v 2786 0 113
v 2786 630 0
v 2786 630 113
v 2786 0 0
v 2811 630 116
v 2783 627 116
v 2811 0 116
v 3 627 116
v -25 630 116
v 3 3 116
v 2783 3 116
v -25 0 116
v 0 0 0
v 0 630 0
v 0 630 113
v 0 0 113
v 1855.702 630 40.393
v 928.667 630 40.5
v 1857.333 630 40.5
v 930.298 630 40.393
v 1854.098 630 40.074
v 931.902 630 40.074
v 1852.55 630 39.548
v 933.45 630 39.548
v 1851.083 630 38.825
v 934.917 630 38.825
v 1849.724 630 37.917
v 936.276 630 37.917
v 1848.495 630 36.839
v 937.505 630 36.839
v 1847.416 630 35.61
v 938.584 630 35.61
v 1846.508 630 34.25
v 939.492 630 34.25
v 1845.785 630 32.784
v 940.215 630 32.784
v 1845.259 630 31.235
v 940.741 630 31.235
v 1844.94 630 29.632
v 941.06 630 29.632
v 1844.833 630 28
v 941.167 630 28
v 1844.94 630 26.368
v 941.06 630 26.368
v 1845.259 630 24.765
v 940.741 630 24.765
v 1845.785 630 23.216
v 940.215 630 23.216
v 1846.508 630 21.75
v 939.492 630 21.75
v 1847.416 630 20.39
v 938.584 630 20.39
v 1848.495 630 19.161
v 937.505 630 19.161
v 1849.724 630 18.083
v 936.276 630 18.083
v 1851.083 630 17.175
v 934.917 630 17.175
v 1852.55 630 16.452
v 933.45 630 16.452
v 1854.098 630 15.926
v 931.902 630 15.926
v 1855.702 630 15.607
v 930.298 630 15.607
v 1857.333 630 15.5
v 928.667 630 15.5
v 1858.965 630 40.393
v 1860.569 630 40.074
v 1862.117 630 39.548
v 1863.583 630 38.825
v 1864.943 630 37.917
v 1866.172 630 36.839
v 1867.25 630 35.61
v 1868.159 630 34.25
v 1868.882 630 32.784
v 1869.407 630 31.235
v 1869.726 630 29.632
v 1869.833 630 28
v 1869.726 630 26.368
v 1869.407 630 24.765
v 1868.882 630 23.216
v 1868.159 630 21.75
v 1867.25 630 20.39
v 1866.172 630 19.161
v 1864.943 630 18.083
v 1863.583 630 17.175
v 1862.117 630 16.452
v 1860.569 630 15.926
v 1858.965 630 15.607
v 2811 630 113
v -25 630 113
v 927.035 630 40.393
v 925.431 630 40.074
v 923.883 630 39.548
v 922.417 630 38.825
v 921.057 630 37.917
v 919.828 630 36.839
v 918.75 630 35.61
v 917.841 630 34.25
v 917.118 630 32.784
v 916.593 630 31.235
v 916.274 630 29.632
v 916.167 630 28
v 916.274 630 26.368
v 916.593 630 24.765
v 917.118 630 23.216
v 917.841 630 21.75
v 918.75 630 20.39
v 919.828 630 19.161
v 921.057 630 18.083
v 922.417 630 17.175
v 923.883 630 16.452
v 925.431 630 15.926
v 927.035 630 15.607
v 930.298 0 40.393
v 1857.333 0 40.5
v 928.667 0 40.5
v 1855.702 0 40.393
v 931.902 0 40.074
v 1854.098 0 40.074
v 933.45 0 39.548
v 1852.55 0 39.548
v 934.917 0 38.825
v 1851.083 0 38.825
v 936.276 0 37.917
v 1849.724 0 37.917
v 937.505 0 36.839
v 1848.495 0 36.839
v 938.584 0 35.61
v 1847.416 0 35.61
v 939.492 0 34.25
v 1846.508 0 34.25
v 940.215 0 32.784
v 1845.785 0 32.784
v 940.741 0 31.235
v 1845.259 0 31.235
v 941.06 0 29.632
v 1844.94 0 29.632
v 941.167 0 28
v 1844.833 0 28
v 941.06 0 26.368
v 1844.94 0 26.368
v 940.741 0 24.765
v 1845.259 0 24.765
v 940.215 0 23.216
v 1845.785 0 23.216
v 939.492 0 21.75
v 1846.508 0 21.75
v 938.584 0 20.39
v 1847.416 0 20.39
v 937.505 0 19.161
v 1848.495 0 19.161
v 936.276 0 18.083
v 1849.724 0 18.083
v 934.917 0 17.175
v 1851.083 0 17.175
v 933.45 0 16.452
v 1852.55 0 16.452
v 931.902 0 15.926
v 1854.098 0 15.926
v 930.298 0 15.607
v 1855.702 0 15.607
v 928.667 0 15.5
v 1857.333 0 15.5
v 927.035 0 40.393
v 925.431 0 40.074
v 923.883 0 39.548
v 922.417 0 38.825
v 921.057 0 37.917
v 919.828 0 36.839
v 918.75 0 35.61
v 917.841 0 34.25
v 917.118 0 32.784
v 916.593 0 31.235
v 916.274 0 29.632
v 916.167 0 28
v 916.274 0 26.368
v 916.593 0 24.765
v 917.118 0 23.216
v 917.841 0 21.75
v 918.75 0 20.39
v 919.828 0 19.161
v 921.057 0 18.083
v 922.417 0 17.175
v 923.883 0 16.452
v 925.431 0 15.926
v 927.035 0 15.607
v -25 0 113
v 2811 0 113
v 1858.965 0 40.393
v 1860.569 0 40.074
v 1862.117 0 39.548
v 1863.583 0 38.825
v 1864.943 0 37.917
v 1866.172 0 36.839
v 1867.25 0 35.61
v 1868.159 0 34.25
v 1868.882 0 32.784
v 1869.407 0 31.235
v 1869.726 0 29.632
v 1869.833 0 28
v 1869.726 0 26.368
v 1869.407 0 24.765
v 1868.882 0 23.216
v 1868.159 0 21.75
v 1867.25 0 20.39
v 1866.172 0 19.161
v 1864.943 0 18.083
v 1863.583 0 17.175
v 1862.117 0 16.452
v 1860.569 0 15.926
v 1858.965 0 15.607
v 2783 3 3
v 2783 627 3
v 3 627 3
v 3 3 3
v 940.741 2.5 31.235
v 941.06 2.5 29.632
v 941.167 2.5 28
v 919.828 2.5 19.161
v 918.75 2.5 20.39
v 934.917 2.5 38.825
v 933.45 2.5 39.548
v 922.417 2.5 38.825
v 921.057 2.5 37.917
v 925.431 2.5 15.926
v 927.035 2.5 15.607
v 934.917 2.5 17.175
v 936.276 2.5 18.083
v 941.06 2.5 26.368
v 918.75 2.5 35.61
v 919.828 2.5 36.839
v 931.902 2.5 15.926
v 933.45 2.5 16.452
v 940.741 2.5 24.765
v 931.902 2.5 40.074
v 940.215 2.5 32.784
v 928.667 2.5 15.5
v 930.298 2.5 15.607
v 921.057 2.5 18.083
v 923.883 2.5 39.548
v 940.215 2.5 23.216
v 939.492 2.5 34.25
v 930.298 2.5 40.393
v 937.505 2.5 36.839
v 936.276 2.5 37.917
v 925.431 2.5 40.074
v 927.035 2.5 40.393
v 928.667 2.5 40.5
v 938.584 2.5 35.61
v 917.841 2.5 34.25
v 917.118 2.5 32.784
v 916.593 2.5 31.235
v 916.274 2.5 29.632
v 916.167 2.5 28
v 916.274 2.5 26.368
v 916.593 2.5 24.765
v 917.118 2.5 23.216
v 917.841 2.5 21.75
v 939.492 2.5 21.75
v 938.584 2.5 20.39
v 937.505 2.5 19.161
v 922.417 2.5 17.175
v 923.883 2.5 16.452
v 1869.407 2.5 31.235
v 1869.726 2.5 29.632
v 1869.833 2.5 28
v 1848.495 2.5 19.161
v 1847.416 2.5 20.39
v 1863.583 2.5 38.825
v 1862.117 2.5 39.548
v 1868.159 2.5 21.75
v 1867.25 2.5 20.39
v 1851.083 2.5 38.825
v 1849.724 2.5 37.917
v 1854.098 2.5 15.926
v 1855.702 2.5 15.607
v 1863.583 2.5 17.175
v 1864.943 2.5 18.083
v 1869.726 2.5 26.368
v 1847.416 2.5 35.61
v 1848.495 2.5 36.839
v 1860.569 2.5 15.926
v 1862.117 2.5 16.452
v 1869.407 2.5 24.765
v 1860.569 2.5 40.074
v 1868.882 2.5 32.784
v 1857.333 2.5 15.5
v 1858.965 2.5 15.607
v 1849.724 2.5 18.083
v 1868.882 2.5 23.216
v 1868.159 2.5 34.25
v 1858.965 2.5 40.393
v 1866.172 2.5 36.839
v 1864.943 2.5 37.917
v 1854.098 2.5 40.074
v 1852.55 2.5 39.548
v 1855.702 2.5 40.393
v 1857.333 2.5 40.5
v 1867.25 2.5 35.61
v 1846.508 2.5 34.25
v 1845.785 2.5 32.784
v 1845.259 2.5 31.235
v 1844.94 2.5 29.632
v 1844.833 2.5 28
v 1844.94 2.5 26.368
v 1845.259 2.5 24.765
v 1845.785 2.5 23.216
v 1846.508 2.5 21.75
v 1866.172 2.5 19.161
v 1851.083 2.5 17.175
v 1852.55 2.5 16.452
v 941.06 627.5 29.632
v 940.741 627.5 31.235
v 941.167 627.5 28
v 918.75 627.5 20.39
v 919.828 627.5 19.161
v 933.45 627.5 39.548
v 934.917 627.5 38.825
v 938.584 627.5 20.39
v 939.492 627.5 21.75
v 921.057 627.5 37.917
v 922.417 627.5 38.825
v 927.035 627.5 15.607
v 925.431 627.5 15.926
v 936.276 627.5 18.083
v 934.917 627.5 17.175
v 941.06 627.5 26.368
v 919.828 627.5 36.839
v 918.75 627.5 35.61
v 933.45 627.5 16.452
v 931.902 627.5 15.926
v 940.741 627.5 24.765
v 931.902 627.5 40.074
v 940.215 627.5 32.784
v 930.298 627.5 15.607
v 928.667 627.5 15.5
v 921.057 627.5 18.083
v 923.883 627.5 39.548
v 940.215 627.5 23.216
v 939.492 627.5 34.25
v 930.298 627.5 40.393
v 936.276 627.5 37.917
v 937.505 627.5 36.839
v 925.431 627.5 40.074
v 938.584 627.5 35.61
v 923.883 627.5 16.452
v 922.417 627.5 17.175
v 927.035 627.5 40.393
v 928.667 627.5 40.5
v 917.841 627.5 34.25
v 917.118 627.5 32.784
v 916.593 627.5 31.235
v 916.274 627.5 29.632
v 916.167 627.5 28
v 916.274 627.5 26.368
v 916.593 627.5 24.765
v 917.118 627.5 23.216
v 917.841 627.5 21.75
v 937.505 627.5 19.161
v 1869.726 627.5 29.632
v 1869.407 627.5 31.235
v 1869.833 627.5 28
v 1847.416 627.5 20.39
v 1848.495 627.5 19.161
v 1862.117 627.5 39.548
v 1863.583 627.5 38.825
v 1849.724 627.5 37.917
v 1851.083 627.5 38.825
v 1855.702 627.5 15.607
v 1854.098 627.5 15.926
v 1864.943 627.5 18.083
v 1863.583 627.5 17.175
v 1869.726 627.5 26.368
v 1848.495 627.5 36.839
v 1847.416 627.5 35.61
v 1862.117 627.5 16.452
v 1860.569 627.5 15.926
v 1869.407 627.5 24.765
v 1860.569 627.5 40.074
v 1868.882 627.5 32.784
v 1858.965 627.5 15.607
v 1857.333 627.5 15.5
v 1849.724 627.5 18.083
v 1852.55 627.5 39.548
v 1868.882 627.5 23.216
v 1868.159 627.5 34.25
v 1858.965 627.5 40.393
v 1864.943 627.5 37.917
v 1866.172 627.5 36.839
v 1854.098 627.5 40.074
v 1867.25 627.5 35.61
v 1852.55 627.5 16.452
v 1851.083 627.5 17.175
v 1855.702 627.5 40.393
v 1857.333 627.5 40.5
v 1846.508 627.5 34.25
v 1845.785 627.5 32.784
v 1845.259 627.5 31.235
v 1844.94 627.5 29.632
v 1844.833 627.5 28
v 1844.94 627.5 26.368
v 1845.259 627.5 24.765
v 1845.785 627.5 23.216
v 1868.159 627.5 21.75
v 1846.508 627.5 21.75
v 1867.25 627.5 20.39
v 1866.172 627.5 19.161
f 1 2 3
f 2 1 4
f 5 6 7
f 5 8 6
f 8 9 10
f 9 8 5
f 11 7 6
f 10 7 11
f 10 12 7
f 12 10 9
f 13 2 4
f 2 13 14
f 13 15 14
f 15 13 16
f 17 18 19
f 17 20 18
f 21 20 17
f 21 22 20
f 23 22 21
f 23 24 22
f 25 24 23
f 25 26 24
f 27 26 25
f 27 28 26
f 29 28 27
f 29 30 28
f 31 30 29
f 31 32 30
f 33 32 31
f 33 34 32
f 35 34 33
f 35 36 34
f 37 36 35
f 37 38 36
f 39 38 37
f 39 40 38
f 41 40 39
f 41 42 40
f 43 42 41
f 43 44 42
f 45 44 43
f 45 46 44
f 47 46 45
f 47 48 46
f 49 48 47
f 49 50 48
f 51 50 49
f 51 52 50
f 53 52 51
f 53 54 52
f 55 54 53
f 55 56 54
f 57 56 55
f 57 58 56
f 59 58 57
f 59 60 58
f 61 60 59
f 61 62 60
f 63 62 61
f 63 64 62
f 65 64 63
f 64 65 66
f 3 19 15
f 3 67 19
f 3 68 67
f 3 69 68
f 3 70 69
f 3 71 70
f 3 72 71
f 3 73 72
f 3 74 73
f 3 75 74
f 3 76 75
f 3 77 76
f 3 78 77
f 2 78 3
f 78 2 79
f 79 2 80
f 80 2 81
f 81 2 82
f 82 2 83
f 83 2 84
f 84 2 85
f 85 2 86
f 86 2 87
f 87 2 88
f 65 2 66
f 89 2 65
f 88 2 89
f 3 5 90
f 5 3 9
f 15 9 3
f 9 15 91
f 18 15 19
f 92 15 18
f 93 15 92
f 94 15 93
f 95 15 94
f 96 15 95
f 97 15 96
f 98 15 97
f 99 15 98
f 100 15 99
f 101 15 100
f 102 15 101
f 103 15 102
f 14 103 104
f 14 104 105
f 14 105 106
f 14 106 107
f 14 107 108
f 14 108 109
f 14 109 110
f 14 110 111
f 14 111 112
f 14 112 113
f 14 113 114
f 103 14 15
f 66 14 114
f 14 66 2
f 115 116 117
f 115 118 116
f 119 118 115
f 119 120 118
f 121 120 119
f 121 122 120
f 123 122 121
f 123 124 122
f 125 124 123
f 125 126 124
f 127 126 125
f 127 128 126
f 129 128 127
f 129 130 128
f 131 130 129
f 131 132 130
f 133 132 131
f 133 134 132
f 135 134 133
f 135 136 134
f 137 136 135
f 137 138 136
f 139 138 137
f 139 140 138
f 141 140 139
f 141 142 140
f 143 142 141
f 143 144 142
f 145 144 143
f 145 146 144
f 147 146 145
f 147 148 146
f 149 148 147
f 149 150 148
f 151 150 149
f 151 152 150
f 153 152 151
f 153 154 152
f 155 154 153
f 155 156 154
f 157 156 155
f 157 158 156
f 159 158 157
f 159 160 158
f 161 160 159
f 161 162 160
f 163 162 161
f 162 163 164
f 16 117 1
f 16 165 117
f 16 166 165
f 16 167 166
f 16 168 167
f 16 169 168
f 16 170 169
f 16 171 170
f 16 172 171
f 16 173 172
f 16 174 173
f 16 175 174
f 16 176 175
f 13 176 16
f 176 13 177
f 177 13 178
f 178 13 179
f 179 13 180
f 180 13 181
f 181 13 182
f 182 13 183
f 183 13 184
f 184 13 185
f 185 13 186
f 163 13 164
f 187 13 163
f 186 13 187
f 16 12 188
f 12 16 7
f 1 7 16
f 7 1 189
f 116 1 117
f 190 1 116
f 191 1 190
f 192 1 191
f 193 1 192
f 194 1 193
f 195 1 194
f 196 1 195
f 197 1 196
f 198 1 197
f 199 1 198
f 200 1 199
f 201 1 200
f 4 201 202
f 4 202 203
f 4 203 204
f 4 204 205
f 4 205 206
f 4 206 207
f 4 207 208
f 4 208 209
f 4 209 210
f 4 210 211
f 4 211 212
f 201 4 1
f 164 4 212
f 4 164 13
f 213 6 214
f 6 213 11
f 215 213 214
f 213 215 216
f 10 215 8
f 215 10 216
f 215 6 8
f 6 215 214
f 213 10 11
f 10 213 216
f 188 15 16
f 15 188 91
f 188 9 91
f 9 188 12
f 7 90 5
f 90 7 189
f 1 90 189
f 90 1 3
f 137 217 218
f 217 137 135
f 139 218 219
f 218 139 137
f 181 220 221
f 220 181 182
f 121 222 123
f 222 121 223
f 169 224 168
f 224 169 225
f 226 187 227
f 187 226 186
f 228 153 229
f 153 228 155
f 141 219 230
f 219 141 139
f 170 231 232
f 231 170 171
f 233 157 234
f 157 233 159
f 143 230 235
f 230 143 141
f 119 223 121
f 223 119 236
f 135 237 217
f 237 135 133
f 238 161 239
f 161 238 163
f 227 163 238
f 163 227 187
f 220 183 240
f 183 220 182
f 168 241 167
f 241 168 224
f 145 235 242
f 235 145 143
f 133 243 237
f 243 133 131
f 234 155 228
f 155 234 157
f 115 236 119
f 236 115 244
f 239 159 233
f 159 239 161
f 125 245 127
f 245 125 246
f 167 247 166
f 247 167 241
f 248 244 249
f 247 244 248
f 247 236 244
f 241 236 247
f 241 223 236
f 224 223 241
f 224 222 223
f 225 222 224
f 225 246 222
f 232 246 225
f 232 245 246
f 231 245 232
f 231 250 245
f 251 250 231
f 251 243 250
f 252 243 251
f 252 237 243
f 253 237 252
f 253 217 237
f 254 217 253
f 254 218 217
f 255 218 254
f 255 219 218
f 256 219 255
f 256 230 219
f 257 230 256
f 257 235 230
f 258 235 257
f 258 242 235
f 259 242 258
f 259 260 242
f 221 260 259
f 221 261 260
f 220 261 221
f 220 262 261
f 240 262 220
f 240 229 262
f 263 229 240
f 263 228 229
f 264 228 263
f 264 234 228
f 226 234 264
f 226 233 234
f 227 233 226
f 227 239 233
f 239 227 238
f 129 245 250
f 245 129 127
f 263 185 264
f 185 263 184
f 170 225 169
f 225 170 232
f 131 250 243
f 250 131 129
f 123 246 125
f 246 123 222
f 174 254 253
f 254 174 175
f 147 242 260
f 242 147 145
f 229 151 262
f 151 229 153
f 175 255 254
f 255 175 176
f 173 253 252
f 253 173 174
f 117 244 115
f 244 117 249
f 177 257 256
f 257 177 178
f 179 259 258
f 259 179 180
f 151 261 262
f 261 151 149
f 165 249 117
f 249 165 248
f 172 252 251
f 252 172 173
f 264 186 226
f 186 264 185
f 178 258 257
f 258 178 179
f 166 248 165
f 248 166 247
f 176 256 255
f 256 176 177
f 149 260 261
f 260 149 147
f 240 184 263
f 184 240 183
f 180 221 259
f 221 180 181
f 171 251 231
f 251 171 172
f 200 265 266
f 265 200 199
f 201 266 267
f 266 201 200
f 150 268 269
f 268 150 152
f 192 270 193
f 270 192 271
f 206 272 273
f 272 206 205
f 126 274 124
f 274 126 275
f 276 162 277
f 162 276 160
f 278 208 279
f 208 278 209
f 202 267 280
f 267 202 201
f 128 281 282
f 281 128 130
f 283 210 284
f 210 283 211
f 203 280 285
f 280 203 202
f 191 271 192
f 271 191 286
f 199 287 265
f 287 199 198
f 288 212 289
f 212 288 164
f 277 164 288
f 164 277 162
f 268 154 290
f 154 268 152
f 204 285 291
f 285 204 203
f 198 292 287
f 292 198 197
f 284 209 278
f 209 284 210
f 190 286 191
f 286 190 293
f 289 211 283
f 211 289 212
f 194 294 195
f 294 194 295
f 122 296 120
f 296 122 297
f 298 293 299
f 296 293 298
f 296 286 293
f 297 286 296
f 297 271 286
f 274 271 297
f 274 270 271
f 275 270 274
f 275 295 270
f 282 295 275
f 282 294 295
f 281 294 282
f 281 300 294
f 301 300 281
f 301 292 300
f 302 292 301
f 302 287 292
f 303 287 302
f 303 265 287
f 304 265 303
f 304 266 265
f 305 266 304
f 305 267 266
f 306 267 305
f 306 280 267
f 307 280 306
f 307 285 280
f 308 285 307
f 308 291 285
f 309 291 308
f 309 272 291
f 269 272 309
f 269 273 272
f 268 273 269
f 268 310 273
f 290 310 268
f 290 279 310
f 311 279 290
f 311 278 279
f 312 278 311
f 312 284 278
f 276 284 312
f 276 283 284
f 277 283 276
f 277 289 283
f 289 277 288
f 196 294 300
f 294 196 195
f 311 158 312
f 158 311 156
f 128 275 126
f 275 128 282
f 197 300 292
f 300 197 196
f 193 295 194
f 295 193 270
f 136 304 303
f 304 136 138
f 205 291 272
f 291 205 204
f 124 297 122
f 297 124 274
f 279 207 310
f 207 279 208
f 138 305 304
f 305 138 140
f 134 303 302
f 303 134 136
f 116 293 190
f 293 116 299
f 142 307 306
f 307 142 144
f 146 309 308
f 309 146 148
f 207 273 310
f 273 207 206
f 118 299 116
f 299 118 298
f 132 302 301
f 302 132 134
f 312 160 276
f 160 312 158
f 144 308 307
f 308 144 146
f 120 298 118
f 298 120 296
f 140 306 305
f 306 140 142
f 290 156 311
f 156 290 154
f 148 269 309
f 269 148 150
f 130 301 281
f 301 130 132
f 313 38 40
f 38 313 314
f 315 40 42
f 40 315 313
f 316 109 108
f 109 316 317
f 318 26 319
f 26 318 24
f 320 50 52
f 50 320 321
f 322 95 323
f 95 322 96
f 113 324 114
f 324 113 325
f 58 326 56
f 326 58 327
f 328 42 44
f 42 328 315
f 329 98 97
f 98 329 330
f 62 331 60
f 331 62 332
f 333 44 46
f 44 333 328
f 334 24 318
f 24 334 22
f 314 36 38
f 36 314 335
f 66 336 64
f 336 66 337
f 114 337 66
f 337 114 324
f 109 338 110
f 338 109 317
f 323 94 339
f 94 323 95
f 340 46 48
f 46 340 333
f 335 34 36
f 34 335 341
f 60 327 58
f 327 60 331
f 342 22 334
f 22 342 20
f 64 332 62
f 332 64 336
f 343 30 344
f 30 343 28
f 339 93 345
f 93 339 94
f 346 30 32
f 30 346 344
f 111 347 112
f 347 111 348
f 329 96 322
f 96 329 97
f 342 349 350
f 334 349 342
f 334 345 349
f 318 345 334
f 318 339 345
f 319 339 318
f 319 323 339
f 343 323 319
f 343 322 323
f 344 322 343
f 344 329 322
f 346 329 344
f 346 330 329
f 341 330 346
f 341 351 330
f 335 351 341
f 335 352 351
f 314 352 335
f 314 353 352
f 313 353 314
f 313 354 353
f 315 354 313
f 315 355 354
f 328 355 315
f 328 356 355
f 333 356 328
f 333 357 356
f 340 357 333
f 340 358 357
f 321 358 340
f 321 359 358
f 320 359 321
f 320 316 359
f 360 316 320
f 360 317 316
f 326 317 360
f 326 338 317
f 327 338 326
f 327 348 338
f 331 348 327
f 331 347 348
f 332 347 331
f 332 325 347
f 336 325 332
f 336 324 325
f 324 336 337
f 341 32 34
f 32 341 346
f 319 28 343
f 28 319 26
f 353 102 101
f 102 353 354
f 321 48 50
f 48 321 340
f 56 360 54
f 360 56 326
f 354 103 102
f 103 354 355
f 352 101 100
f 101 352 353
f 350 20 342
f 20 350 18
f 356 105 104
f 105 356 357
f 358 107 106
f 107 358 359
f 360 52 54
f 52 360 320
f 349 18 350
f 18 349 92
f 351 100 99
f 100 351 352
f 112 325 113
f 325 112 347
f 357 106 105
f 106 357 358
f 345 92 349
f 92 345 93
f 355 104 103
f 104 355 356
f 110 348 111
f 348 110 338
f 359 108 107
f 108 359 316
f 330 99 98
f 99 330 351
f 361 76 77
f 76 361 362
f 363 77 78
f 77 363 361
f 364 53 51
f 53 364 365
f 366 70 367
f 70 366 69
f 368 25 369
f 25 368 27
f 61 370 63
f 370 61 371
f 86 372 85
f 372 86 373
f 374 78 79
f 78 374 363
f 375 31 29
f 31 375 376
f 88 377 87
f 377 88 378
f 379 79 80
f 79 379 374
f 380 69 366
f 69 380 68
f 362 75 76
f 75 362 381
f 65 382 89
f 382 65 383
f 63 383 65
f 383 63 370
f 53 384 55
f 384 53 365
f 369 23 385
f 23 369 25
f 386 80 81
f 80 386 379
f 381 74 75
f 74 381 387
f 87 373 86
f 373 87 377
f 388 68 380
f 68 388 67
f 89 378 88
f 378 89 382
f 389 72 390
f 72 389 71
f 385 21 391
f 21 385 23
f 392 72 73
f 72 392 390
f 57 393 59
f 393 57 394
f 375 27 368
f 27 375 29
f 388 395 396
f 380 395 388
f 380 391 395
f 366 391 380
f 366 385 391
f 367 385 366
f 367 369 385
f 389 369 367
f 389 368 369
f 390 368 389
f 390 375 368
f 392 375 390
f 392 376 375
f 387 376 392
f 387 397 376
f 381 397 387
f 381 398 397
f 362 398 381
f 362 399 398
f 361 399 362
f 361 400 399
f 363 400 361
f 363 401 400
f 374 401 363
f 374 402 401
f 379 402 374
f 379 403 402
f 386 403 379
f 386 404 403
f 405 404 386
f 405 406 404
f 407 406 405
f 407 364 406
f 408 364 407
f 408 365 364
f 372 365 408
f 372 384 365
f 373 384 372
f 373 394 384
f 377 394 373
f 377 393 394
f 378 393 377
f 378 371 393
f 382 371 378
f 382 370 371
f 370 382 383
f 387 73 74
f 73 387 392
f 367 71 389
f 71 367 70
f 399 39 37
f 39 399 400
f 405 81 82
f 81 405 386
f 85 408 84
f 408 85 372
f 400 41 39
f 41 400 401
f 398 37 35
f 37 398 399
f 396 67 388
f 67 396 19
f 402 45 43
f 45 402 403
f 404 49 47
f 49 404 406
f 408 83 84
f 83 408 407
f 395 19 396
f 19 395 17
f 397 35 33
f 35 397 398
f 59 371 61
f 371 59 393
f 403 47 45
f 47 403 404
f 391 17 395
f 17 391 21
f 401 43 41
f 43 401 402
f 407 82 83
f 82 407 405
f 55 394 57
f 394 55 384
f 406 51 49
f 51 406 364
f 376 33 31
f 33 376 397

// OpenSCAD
// 944 EV — BATTERY ENCLOSURE  (parametric, folded/welded sheet box)
// Two needed: FRONT box (6 modules) + MAIN box (8 modules). Set the layout +
// bay limits below. All dims mm. NO 3D printer here -> fit-check with a CARDBOARD
// mock at the EXTERNAL dims this echoes. Spec: cad/battery-enclosure-spec.md.

/* ---- WHICH BOX (set the module grid) ---- */
modules_x = 4;    // modules along the car's length
modules_y = 2;    // modules across the car's width
layers    = 1;    // vertical layers (watch ground clearance!)

/* ---- MODULE size (Tesla 5.3 kWh default; MEASURE Leaf for Stage 1) ---- */
mod_L = 685;  // module length   (Tesla ~685 -- the tight dimension in the 944!)
mod_W = 300;  // module width
mod_H = 85;   // module height

/* ---- ENCLOSURE ---- */
clear    = 8;     // clearance around modules
wall_t   = 3;     // aluminum sheet thickness (light, ADR-0011)
floor_t  = 3;
flange_w = 25;    // mounting-flange width (bolts to frame rails)
flange_t = 3;
vent_d   = 25;    // vent port diameter
vents    = 2;     // vents per long side

/* ---- BAY LIMIT (MEASURE on the car) — sanity check only ---- */
bay_L = 0;  // MEASURE bay length (0 = skip the check)
bay_W = 0;  // MEASURE bay width
bay_H = 0;  // MEASURE bay depth (mind ground clearance + skid plate)

// ---- derived ----
in_L  = modules_x*mod_L + (modules_x+1)*clear;
in_W  = modules_y*mod_W + (modules_y+1)*clear;
in_H  = layers*mod_H + clear + 20;          // +20 for busbars/wiring
ext_L = in_L + 2*wall_t;
ext_W = in_W + 2*wall_t;
ext_H = in_H + floor_t;

echo(str("INTERNAL  L=", in_L,  "  W=", in_W,  "  H=", in_H,  " mm"));
echo(str("EXTERNAL  L=", ext_L, "  W=", ext_W, "  H=", ext_H, " mm  (+", flange_w, " flanges)"));
if (bay_L > 0)
  echo(str("BAY FIT?  L ", ext_L, "/", bay_L, "  W ", ext_W, "/", bay_W,
           "  H ", ext_H, "/", bay_H, "   (external must be <= bay)"));

$fn = 48;

module enclosure() {
  difference() {
    union() {
      difference() {                                  // open-top tray
        cube([ext_L, ext_W, ext_H]);
        translate([wall_t, wall_t, floor_t]) cube([in_L, in_W, in_H + 1]);
      }
      translate([-flange_w, 0, ext_H - flange_t]) cube([flange_w, ext_W, flange_t]);
      translate([ext_L, 0, ext_H - flange_t])     cube([flange_w, ext_W, flange_t]);
    }
    for (s = [0, 1], i = [1 : vents])               // low vent ports
      translate([i*ext_L/(vents+1), s*ext_W, floor_t + vent_d])
        rotate([90, 0, 0]) cylinder(d = vent_d, h = wall_t + 2, center = true);
  }
  %for (xi = [0:modules_x-1], yi = [0:modules_y-1], zi = [0:layers-1])  // module ghosts
    translate([wall_t + clear + xi*(mod_L+clear),
               wall_t + clear + yi*(mod_W+clear),
               floor_t + zi*mod_H])
      cube([mod_L, mod_W, mod_H]);
}

enclosure();
